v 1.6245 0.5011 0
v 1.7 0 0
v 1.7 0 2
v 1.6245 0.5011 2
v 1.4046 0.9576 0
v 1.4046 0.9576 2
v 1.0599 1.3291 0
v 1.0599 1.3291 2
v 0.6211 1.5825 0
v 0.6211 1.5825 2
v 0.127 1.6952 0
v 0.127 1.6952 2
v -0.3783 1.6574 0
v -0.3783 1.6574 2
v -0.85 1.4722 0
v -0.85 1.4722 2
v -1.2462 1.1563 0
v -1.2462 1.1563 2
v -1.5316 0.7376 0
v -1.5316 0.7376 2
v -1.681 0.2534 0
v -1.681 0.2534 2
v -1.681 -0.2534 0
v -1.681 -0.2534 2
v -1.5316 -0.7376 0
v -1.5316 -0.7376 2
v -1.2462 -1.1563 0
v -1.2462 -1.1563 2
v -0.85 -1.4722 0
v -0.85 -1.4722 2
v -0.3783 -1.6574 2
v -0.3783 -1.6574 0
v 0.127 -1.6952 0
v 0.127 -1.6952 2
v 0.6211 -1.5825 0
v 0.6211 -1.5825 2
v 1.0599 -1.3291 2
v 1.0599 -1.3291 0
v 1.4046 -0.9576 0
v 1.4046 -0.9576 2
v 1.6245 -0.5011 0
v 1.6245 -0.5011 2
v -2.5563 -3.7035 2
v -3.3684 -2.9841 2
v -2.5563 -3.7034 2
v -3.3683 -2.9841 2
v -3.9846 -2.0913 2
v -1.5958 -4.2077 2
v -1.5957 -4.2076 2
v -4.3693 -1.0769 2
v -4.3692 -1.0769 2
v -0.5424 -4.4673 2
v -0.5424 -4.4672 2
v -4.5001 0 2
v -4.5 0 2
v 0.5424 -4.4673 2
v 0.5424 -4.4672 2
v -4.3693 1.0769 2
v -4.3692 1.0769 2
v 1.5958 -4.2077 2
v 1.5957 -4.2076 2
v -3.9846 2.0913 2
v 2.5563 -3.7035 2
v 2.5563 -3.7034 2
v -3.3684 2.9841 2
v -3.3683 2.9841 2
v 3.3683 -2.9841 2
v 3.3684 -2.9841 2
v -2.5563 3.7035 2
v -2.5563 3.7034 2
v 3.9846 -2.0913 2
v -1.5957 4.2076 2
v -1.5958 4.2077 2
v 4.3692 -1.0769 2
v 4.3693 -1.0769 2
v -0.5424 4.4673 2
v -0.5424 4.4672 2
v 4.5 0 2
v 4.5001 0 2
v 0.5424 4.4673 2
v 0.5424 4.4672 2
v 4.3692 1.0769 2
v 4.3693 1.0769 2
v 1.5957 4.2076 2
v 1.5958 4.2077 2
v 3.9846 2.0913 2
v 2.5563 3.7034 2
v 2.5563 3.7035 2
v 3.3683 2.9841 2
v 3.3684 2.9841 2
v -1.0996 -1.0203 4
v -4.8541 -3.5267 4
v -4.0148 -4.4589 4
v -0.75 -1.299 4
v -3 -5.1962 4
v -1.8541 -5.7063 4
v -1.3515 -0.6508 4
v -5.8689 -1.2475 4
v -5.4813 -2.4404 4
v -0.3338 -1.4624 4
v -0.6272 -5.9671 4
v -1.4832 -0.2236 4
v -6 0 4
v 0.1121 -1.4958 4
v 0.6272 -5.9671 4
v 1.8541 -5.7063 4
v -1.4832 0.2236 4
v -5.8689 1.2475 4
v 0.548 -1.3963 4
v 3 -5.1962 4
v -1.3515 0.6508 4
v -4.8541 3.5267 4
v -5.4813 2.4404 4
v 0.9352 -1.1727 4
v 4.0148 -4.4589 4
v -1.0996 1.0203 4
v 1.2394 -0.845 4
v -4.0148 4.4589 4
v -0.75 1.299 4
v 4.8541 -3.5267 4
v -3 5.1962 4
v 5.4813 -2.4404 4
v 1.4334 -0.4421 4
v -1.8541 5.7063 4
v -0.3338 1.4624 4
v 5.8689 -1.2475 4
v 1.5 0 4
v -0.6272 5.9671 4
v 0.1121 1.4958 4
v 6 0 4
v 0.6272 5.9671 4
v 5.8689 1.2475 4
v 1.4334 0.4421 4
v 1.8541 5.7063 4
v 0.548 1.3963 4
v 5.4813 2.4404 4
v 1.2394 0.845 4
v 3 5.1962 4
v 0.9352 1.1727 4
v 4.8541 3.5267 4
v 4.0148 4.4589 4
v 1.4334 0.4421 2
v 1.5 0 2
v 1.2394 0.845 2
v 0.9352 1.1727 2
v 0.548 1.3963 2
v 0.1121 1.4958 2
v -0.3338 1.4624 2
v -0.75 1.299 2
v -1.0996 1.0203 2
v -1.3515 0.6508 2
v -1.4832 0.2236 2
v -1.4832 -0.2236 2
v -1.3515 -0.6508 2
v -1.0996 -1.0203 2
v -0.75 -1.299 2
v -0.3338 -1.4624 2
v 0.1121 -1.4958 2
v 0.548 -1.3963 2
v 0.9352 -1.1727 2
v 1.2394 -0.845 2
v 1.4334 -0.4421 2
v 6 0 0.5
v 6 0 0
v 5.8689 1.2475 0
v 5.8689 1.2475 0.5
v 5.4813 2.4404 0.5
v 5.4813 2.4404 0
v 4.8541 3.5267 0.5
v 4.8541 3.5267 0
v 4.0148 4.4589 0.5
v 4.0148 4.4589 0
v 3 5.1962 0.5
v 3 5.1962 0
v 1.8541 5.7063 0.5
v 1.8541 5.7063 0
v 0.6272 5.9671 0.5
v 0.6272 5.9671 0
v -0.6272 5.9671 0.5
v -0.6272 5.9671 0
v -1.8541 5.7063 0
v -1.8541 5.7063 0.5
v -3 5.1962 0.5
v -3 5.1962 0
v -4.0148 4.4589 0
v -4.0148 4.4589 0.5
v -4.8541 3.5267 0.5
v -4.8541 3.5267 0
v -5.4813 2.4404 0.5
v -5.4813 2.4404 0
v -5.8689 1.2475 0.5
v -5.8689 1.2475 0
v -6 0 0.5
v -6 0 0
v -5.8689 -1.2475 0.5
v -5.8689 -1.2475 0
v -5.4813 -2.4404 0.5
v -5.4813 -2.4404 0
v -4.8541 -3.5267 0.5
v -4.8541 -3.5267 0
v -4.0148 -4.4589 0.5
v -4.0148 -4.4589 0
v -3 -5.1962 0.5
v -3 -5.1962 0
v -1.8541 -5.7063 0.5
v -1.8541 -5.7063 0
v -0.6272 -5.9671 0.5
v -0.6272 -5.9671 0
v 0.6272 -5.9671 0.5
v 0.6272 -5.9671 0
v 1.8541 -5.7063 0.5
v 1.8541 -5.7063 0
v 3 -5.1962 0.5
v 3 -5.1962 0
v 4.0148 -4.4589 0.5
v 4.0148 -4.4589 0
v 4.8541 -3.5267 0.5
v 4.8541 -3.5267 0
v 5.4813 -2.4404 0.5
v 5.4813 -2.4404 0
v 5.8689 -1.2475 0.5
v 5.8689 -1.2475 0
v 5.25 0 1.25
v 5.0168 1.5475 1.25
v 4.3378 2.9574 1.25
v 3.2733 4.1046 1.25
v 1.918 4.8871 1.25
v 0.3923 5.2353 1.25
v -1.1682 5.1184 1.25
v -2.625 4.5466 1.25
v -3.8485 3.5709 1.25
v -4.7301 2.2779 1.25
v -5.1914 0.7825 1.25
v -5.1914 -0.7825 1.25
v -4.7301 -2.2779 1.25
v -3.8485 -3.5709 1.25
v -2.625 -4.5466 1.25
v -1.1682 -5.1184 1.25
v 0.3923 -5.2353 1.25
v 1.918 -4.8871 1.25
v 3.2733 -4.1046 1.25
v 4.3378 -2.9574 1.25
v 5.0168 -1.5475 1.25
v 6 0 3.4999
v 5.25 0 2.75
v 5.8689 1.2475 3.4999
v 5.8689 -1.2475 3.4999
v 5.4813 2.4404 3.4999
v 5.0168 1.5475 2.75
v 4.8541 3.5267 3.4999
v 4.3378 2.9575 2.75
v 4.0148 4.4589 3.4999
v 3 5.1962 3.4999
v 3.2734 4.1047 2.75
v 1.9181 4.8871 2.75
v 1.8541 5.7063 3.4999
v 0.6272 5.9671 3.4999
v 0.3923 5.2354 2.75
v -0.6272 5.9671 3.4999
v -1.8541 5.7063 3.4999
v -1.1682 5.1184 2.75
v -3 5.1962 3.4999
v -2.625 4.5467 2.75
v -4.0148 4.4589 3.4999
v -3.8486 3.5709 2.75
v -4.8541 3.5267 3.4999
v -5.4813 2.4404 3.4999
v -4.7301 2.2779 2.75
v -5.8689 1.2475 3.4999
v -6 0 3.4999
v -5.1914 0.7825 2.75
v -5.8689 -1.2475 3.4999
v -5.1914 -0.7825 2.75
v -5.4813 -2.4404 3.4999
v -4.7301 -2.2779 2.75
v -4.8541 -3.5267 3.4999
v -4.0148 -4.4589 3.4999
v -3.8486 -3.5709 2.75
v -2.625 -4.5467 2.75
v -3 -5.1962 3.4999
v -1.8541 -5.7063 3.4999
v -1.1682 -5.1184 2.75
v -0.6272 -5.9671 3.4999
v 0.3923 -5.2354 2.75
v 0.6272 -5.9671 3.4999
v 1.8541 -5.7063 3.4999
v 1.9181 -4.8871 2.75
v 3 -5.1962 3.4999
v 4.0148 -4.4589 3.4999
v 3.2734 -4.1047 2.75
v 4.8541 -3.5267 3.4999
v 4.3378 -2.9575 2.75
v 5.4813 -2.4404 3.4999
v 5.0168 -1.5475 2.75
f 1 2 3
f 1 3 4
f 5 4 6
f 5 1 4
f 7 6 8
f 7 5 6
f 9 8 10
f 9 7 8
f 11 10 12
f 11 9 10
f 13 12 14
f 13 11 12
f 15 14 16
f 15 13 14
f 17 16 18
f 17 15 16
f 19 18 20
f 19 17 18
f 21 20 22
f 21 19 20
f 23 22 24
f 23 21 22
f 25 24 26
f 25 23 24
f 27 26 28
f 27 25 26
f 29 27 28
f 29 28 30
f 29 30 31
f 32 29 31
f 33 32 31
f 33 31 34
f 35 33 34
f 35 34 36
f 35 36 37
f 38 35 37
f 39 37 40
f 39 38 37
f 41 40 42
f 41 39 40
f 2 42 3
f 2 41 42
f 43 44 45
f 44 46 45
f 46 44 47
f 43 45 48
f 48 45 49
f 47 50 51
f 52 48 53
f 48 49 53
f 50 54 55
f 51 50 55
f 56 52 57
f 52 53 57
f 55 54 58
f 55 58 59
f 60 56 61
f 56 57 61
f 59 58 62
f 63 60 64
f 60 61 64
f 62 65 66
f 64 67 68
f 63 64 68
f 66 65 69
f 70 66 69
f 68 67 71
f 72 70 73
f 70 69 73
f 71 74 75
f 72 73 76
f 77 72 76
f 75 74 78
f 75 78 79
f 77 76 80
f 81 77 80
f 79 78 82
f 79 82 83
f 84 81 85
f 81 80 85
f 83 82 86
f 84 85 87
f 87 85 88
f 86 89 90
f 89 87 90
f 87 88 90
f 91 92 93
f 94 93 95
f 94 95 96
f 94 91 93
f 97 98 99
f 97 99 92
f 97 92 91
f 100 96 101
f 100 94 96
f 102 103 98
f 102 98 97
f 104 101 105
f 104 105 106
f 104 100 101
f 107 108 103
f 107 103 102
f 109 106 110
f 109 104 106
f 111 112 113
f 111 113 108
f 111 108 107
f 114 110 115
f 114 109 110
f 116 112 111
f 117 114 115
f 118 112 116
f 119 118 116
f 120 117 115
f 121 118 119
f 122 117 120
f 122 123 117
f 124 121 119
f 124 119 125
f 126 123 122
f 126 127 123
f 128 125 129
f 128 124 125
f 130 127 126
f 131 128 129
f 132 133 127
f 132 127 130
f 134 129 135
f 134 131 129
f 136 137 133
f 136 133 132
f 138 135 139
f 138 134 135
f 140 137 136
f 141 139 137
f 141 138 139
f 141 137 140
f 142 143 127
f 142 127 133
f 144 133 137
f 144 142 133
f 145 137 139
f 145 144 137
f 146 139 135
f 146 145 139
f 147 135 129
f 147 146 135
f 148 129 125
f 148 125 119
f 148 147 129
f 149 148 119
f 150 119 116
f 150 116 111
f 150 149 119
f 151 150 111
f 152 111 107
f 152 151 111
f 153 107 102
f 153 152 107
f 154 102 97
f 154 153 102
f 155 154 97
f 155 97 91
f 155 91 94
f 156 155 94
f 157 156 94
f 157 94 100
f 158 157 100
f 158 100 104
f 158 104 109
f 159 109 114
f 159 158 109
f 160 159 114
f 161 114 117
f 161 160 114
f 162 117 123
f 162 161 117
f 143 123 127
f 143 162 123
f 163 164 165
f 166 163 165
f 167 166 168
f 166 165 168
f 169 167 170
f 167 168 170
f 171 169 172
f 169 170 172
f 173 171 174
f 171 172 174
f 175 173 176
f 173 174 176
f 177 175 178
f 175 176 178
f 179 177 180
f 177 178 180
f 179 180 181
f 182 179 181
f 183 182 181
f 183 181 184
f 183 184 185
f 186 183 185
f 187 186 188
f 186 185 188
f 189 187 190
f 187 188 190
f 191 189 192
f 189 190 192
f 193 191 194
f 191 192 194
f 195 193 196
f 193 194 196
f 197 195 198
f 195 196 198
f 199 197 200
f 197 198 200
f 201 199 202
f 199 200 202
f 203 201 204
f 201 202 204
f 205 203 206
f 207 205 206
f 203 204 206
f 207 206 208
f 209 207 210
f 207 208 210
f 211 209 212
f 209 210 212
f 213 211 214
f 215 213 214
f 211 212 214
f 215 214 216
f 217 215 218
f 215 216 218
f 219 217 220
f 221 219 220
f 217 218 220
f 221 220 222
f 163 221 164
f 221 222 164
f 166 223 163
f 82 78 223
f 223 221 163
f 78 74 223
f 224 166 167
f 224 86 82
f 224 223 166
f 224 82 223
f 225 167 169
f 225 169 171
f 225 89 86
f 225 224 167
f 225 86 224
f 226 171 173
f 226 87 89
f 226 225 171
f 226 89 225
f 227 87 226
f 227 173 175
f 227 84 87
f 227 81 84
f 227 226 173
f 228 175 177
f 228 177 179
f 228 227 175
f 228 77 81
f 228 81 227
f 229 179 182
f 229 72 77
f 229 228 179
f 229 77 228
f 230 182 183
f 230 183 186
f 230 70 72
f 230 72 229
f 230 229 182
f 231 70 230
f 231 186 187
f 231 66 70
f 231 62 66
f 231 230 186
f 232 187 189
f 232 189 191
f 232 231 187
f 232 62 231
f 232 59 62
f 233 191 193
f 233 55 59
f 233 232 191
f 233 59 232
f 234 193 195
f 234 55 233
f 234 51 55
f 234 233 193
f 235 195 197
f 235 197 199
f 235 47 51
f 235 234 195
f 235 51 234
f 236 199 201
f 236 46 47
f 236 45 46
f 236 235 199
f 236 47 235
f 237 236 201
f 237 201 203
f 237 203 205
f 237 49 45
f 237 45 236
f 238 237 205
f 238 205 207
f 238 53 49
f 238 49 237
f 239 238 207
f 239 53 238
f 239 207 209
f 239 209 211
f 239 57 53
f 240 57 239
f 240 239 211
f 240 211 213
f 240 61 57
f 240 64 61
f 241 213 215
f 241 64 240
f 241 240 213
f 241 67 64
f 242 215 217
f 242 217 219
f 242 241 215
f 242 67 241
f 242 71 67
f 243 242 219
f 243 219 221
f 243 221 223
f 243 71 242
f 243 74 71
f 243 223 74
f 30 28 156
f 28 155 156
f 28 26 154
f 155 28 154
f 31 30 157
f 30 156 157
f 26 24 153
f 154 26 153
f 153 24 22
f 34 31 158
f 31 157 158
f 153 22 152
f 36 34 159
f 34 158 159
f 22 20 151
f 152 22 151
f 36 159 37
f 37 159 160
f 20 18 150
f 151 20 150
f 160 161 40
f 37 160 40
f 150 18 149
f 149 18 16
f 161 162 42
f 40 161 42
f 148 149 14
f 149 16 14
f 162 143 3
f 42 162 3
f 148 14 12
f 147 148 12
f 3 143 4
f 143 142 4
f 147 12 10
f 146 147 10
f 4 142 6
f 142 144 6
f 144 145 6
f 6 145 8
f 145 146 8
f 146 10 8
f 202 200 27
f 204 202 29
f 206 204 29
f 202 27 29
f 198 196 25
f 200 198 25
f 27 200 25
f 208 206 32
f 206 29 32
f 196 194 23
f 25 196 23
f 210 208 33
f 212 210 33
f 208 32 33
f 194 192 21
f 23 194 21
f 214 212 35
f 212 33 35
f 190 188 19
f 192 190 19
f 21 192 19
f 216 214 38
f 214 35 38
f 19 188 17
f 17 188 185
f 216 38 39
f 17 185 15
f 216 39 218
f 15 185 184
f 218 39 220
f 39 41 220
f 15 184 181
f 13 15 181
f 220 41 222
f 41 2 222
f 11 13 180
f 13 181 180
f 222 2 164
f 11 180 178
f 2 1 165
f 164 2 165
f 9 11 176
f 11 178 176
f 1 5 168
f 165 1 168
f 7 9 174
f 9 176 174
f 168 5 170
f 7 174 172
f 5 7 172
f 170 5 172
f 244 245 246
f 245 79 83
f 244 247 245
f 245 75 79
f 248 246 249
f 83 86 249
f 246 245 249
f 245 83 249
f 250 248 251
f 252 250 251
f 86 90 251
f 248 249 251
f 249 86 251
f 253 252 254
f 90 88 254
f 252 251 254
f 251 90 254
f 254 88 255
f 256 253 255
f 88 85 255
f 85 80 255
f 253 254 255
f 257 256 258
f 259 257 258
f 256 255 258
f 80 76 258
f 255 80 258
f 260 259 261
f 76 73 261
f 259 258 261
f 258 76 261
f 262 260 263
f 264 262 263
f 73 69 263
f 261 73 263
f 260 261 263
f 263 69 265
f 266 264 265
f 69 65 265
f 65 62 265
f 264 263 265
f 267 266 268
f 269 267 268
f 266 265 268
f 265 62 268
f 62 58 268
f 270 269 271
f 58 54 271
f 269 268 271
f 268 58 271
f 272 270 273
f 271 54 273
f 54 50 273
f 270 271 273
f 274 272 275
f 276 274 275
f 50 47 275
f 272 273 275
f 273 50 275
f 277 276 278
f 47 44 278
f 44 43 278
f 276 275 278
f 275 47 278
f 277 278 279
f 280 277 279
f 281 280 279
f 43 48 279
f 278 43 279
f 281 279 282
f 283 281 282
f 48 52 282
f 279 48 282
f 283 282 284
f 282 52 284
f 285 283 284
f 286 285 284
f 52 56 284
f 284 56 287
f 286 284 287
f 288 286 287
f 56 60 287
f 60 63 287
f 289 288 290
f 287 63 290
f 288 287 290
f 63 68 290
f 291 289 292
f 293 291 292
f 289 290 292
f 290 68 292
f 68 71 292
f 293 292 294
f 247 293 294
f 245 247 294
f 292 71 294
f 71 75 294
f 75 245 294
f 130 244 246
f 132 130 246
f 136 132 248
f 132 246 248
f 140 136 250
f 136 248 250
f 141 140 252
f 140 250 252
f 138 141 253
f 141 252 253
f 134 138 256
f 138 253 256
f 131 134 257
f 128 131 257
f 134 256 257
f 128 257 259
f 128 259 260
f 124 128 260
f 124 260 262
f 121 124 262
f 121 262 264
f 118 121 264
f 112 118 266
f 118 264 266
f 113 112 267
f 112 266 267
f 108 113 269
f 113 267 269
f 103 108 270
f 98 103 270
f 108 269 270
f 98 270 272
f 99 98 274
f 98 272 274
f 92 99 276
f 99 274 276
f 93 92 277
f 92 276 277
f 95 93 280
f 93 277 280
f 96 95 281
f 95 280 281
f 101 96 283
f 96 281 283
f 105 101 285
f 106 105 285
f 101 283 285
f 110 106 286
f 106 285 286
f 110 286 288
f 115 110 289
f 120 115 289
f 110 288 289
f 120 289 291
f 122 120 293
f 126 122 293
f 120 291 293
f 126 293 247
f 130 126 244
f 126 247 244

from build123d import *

# Parameters (mm, degrees)
SKETCH1_R           = 6
SKETCH1_R_2         = 1.7
BOSS_EXTRUDE1_DEPTH = 2
CHAMFER1_SIZE       = 1.5
SKETCH2_R           = 6
SKETCH2_R_2         = 1.5
BOSS_EXTRUDE2_DEPTH = 2
CHAMFER2_SIZE       = 1.5


with BuildPart() as part:
    # Sketch1 → Boss-Extrude1 (new body)
    with BuildSketch(Plane.XY):
        Circle(SKETCH1_R)
        Circle(SKETCH1_R_2, mode=Mode.SUBTRACT)
    extrude(amount=BOSS_EXTRUDE1_DEPTH)

    # Chamfer1
    chamfer1_edges = [part.edges().sort_by_distance(p)[0] for p in [
        (-6, 0, 2),
    ]]
    chamfer(chamfer1_edges, length=CHAMFER1_SIZE)

    # Sketch2 → Boss-Extrude2 (add)
    with BuildSketch(Plane.XY.offset(2)):
        Circle(SKETCH2_R)
        Circle(SKETCH2_R_2, mode=Mode.SUBTRACT)
    extrude(amount=BOSS_EXTRUDE2_DEPTH)

    # Chamfer2
    chamfer2_edges = [part.edges().sort_by_distance(p)[0] for p in [
        (-6, 0, 2),
    ]]
    chamfer(chamfer2_edges, length=CHAMFER2_SIZE - 0.0001)  # a hair under: the kernel refuses the full size


solid = part.part
